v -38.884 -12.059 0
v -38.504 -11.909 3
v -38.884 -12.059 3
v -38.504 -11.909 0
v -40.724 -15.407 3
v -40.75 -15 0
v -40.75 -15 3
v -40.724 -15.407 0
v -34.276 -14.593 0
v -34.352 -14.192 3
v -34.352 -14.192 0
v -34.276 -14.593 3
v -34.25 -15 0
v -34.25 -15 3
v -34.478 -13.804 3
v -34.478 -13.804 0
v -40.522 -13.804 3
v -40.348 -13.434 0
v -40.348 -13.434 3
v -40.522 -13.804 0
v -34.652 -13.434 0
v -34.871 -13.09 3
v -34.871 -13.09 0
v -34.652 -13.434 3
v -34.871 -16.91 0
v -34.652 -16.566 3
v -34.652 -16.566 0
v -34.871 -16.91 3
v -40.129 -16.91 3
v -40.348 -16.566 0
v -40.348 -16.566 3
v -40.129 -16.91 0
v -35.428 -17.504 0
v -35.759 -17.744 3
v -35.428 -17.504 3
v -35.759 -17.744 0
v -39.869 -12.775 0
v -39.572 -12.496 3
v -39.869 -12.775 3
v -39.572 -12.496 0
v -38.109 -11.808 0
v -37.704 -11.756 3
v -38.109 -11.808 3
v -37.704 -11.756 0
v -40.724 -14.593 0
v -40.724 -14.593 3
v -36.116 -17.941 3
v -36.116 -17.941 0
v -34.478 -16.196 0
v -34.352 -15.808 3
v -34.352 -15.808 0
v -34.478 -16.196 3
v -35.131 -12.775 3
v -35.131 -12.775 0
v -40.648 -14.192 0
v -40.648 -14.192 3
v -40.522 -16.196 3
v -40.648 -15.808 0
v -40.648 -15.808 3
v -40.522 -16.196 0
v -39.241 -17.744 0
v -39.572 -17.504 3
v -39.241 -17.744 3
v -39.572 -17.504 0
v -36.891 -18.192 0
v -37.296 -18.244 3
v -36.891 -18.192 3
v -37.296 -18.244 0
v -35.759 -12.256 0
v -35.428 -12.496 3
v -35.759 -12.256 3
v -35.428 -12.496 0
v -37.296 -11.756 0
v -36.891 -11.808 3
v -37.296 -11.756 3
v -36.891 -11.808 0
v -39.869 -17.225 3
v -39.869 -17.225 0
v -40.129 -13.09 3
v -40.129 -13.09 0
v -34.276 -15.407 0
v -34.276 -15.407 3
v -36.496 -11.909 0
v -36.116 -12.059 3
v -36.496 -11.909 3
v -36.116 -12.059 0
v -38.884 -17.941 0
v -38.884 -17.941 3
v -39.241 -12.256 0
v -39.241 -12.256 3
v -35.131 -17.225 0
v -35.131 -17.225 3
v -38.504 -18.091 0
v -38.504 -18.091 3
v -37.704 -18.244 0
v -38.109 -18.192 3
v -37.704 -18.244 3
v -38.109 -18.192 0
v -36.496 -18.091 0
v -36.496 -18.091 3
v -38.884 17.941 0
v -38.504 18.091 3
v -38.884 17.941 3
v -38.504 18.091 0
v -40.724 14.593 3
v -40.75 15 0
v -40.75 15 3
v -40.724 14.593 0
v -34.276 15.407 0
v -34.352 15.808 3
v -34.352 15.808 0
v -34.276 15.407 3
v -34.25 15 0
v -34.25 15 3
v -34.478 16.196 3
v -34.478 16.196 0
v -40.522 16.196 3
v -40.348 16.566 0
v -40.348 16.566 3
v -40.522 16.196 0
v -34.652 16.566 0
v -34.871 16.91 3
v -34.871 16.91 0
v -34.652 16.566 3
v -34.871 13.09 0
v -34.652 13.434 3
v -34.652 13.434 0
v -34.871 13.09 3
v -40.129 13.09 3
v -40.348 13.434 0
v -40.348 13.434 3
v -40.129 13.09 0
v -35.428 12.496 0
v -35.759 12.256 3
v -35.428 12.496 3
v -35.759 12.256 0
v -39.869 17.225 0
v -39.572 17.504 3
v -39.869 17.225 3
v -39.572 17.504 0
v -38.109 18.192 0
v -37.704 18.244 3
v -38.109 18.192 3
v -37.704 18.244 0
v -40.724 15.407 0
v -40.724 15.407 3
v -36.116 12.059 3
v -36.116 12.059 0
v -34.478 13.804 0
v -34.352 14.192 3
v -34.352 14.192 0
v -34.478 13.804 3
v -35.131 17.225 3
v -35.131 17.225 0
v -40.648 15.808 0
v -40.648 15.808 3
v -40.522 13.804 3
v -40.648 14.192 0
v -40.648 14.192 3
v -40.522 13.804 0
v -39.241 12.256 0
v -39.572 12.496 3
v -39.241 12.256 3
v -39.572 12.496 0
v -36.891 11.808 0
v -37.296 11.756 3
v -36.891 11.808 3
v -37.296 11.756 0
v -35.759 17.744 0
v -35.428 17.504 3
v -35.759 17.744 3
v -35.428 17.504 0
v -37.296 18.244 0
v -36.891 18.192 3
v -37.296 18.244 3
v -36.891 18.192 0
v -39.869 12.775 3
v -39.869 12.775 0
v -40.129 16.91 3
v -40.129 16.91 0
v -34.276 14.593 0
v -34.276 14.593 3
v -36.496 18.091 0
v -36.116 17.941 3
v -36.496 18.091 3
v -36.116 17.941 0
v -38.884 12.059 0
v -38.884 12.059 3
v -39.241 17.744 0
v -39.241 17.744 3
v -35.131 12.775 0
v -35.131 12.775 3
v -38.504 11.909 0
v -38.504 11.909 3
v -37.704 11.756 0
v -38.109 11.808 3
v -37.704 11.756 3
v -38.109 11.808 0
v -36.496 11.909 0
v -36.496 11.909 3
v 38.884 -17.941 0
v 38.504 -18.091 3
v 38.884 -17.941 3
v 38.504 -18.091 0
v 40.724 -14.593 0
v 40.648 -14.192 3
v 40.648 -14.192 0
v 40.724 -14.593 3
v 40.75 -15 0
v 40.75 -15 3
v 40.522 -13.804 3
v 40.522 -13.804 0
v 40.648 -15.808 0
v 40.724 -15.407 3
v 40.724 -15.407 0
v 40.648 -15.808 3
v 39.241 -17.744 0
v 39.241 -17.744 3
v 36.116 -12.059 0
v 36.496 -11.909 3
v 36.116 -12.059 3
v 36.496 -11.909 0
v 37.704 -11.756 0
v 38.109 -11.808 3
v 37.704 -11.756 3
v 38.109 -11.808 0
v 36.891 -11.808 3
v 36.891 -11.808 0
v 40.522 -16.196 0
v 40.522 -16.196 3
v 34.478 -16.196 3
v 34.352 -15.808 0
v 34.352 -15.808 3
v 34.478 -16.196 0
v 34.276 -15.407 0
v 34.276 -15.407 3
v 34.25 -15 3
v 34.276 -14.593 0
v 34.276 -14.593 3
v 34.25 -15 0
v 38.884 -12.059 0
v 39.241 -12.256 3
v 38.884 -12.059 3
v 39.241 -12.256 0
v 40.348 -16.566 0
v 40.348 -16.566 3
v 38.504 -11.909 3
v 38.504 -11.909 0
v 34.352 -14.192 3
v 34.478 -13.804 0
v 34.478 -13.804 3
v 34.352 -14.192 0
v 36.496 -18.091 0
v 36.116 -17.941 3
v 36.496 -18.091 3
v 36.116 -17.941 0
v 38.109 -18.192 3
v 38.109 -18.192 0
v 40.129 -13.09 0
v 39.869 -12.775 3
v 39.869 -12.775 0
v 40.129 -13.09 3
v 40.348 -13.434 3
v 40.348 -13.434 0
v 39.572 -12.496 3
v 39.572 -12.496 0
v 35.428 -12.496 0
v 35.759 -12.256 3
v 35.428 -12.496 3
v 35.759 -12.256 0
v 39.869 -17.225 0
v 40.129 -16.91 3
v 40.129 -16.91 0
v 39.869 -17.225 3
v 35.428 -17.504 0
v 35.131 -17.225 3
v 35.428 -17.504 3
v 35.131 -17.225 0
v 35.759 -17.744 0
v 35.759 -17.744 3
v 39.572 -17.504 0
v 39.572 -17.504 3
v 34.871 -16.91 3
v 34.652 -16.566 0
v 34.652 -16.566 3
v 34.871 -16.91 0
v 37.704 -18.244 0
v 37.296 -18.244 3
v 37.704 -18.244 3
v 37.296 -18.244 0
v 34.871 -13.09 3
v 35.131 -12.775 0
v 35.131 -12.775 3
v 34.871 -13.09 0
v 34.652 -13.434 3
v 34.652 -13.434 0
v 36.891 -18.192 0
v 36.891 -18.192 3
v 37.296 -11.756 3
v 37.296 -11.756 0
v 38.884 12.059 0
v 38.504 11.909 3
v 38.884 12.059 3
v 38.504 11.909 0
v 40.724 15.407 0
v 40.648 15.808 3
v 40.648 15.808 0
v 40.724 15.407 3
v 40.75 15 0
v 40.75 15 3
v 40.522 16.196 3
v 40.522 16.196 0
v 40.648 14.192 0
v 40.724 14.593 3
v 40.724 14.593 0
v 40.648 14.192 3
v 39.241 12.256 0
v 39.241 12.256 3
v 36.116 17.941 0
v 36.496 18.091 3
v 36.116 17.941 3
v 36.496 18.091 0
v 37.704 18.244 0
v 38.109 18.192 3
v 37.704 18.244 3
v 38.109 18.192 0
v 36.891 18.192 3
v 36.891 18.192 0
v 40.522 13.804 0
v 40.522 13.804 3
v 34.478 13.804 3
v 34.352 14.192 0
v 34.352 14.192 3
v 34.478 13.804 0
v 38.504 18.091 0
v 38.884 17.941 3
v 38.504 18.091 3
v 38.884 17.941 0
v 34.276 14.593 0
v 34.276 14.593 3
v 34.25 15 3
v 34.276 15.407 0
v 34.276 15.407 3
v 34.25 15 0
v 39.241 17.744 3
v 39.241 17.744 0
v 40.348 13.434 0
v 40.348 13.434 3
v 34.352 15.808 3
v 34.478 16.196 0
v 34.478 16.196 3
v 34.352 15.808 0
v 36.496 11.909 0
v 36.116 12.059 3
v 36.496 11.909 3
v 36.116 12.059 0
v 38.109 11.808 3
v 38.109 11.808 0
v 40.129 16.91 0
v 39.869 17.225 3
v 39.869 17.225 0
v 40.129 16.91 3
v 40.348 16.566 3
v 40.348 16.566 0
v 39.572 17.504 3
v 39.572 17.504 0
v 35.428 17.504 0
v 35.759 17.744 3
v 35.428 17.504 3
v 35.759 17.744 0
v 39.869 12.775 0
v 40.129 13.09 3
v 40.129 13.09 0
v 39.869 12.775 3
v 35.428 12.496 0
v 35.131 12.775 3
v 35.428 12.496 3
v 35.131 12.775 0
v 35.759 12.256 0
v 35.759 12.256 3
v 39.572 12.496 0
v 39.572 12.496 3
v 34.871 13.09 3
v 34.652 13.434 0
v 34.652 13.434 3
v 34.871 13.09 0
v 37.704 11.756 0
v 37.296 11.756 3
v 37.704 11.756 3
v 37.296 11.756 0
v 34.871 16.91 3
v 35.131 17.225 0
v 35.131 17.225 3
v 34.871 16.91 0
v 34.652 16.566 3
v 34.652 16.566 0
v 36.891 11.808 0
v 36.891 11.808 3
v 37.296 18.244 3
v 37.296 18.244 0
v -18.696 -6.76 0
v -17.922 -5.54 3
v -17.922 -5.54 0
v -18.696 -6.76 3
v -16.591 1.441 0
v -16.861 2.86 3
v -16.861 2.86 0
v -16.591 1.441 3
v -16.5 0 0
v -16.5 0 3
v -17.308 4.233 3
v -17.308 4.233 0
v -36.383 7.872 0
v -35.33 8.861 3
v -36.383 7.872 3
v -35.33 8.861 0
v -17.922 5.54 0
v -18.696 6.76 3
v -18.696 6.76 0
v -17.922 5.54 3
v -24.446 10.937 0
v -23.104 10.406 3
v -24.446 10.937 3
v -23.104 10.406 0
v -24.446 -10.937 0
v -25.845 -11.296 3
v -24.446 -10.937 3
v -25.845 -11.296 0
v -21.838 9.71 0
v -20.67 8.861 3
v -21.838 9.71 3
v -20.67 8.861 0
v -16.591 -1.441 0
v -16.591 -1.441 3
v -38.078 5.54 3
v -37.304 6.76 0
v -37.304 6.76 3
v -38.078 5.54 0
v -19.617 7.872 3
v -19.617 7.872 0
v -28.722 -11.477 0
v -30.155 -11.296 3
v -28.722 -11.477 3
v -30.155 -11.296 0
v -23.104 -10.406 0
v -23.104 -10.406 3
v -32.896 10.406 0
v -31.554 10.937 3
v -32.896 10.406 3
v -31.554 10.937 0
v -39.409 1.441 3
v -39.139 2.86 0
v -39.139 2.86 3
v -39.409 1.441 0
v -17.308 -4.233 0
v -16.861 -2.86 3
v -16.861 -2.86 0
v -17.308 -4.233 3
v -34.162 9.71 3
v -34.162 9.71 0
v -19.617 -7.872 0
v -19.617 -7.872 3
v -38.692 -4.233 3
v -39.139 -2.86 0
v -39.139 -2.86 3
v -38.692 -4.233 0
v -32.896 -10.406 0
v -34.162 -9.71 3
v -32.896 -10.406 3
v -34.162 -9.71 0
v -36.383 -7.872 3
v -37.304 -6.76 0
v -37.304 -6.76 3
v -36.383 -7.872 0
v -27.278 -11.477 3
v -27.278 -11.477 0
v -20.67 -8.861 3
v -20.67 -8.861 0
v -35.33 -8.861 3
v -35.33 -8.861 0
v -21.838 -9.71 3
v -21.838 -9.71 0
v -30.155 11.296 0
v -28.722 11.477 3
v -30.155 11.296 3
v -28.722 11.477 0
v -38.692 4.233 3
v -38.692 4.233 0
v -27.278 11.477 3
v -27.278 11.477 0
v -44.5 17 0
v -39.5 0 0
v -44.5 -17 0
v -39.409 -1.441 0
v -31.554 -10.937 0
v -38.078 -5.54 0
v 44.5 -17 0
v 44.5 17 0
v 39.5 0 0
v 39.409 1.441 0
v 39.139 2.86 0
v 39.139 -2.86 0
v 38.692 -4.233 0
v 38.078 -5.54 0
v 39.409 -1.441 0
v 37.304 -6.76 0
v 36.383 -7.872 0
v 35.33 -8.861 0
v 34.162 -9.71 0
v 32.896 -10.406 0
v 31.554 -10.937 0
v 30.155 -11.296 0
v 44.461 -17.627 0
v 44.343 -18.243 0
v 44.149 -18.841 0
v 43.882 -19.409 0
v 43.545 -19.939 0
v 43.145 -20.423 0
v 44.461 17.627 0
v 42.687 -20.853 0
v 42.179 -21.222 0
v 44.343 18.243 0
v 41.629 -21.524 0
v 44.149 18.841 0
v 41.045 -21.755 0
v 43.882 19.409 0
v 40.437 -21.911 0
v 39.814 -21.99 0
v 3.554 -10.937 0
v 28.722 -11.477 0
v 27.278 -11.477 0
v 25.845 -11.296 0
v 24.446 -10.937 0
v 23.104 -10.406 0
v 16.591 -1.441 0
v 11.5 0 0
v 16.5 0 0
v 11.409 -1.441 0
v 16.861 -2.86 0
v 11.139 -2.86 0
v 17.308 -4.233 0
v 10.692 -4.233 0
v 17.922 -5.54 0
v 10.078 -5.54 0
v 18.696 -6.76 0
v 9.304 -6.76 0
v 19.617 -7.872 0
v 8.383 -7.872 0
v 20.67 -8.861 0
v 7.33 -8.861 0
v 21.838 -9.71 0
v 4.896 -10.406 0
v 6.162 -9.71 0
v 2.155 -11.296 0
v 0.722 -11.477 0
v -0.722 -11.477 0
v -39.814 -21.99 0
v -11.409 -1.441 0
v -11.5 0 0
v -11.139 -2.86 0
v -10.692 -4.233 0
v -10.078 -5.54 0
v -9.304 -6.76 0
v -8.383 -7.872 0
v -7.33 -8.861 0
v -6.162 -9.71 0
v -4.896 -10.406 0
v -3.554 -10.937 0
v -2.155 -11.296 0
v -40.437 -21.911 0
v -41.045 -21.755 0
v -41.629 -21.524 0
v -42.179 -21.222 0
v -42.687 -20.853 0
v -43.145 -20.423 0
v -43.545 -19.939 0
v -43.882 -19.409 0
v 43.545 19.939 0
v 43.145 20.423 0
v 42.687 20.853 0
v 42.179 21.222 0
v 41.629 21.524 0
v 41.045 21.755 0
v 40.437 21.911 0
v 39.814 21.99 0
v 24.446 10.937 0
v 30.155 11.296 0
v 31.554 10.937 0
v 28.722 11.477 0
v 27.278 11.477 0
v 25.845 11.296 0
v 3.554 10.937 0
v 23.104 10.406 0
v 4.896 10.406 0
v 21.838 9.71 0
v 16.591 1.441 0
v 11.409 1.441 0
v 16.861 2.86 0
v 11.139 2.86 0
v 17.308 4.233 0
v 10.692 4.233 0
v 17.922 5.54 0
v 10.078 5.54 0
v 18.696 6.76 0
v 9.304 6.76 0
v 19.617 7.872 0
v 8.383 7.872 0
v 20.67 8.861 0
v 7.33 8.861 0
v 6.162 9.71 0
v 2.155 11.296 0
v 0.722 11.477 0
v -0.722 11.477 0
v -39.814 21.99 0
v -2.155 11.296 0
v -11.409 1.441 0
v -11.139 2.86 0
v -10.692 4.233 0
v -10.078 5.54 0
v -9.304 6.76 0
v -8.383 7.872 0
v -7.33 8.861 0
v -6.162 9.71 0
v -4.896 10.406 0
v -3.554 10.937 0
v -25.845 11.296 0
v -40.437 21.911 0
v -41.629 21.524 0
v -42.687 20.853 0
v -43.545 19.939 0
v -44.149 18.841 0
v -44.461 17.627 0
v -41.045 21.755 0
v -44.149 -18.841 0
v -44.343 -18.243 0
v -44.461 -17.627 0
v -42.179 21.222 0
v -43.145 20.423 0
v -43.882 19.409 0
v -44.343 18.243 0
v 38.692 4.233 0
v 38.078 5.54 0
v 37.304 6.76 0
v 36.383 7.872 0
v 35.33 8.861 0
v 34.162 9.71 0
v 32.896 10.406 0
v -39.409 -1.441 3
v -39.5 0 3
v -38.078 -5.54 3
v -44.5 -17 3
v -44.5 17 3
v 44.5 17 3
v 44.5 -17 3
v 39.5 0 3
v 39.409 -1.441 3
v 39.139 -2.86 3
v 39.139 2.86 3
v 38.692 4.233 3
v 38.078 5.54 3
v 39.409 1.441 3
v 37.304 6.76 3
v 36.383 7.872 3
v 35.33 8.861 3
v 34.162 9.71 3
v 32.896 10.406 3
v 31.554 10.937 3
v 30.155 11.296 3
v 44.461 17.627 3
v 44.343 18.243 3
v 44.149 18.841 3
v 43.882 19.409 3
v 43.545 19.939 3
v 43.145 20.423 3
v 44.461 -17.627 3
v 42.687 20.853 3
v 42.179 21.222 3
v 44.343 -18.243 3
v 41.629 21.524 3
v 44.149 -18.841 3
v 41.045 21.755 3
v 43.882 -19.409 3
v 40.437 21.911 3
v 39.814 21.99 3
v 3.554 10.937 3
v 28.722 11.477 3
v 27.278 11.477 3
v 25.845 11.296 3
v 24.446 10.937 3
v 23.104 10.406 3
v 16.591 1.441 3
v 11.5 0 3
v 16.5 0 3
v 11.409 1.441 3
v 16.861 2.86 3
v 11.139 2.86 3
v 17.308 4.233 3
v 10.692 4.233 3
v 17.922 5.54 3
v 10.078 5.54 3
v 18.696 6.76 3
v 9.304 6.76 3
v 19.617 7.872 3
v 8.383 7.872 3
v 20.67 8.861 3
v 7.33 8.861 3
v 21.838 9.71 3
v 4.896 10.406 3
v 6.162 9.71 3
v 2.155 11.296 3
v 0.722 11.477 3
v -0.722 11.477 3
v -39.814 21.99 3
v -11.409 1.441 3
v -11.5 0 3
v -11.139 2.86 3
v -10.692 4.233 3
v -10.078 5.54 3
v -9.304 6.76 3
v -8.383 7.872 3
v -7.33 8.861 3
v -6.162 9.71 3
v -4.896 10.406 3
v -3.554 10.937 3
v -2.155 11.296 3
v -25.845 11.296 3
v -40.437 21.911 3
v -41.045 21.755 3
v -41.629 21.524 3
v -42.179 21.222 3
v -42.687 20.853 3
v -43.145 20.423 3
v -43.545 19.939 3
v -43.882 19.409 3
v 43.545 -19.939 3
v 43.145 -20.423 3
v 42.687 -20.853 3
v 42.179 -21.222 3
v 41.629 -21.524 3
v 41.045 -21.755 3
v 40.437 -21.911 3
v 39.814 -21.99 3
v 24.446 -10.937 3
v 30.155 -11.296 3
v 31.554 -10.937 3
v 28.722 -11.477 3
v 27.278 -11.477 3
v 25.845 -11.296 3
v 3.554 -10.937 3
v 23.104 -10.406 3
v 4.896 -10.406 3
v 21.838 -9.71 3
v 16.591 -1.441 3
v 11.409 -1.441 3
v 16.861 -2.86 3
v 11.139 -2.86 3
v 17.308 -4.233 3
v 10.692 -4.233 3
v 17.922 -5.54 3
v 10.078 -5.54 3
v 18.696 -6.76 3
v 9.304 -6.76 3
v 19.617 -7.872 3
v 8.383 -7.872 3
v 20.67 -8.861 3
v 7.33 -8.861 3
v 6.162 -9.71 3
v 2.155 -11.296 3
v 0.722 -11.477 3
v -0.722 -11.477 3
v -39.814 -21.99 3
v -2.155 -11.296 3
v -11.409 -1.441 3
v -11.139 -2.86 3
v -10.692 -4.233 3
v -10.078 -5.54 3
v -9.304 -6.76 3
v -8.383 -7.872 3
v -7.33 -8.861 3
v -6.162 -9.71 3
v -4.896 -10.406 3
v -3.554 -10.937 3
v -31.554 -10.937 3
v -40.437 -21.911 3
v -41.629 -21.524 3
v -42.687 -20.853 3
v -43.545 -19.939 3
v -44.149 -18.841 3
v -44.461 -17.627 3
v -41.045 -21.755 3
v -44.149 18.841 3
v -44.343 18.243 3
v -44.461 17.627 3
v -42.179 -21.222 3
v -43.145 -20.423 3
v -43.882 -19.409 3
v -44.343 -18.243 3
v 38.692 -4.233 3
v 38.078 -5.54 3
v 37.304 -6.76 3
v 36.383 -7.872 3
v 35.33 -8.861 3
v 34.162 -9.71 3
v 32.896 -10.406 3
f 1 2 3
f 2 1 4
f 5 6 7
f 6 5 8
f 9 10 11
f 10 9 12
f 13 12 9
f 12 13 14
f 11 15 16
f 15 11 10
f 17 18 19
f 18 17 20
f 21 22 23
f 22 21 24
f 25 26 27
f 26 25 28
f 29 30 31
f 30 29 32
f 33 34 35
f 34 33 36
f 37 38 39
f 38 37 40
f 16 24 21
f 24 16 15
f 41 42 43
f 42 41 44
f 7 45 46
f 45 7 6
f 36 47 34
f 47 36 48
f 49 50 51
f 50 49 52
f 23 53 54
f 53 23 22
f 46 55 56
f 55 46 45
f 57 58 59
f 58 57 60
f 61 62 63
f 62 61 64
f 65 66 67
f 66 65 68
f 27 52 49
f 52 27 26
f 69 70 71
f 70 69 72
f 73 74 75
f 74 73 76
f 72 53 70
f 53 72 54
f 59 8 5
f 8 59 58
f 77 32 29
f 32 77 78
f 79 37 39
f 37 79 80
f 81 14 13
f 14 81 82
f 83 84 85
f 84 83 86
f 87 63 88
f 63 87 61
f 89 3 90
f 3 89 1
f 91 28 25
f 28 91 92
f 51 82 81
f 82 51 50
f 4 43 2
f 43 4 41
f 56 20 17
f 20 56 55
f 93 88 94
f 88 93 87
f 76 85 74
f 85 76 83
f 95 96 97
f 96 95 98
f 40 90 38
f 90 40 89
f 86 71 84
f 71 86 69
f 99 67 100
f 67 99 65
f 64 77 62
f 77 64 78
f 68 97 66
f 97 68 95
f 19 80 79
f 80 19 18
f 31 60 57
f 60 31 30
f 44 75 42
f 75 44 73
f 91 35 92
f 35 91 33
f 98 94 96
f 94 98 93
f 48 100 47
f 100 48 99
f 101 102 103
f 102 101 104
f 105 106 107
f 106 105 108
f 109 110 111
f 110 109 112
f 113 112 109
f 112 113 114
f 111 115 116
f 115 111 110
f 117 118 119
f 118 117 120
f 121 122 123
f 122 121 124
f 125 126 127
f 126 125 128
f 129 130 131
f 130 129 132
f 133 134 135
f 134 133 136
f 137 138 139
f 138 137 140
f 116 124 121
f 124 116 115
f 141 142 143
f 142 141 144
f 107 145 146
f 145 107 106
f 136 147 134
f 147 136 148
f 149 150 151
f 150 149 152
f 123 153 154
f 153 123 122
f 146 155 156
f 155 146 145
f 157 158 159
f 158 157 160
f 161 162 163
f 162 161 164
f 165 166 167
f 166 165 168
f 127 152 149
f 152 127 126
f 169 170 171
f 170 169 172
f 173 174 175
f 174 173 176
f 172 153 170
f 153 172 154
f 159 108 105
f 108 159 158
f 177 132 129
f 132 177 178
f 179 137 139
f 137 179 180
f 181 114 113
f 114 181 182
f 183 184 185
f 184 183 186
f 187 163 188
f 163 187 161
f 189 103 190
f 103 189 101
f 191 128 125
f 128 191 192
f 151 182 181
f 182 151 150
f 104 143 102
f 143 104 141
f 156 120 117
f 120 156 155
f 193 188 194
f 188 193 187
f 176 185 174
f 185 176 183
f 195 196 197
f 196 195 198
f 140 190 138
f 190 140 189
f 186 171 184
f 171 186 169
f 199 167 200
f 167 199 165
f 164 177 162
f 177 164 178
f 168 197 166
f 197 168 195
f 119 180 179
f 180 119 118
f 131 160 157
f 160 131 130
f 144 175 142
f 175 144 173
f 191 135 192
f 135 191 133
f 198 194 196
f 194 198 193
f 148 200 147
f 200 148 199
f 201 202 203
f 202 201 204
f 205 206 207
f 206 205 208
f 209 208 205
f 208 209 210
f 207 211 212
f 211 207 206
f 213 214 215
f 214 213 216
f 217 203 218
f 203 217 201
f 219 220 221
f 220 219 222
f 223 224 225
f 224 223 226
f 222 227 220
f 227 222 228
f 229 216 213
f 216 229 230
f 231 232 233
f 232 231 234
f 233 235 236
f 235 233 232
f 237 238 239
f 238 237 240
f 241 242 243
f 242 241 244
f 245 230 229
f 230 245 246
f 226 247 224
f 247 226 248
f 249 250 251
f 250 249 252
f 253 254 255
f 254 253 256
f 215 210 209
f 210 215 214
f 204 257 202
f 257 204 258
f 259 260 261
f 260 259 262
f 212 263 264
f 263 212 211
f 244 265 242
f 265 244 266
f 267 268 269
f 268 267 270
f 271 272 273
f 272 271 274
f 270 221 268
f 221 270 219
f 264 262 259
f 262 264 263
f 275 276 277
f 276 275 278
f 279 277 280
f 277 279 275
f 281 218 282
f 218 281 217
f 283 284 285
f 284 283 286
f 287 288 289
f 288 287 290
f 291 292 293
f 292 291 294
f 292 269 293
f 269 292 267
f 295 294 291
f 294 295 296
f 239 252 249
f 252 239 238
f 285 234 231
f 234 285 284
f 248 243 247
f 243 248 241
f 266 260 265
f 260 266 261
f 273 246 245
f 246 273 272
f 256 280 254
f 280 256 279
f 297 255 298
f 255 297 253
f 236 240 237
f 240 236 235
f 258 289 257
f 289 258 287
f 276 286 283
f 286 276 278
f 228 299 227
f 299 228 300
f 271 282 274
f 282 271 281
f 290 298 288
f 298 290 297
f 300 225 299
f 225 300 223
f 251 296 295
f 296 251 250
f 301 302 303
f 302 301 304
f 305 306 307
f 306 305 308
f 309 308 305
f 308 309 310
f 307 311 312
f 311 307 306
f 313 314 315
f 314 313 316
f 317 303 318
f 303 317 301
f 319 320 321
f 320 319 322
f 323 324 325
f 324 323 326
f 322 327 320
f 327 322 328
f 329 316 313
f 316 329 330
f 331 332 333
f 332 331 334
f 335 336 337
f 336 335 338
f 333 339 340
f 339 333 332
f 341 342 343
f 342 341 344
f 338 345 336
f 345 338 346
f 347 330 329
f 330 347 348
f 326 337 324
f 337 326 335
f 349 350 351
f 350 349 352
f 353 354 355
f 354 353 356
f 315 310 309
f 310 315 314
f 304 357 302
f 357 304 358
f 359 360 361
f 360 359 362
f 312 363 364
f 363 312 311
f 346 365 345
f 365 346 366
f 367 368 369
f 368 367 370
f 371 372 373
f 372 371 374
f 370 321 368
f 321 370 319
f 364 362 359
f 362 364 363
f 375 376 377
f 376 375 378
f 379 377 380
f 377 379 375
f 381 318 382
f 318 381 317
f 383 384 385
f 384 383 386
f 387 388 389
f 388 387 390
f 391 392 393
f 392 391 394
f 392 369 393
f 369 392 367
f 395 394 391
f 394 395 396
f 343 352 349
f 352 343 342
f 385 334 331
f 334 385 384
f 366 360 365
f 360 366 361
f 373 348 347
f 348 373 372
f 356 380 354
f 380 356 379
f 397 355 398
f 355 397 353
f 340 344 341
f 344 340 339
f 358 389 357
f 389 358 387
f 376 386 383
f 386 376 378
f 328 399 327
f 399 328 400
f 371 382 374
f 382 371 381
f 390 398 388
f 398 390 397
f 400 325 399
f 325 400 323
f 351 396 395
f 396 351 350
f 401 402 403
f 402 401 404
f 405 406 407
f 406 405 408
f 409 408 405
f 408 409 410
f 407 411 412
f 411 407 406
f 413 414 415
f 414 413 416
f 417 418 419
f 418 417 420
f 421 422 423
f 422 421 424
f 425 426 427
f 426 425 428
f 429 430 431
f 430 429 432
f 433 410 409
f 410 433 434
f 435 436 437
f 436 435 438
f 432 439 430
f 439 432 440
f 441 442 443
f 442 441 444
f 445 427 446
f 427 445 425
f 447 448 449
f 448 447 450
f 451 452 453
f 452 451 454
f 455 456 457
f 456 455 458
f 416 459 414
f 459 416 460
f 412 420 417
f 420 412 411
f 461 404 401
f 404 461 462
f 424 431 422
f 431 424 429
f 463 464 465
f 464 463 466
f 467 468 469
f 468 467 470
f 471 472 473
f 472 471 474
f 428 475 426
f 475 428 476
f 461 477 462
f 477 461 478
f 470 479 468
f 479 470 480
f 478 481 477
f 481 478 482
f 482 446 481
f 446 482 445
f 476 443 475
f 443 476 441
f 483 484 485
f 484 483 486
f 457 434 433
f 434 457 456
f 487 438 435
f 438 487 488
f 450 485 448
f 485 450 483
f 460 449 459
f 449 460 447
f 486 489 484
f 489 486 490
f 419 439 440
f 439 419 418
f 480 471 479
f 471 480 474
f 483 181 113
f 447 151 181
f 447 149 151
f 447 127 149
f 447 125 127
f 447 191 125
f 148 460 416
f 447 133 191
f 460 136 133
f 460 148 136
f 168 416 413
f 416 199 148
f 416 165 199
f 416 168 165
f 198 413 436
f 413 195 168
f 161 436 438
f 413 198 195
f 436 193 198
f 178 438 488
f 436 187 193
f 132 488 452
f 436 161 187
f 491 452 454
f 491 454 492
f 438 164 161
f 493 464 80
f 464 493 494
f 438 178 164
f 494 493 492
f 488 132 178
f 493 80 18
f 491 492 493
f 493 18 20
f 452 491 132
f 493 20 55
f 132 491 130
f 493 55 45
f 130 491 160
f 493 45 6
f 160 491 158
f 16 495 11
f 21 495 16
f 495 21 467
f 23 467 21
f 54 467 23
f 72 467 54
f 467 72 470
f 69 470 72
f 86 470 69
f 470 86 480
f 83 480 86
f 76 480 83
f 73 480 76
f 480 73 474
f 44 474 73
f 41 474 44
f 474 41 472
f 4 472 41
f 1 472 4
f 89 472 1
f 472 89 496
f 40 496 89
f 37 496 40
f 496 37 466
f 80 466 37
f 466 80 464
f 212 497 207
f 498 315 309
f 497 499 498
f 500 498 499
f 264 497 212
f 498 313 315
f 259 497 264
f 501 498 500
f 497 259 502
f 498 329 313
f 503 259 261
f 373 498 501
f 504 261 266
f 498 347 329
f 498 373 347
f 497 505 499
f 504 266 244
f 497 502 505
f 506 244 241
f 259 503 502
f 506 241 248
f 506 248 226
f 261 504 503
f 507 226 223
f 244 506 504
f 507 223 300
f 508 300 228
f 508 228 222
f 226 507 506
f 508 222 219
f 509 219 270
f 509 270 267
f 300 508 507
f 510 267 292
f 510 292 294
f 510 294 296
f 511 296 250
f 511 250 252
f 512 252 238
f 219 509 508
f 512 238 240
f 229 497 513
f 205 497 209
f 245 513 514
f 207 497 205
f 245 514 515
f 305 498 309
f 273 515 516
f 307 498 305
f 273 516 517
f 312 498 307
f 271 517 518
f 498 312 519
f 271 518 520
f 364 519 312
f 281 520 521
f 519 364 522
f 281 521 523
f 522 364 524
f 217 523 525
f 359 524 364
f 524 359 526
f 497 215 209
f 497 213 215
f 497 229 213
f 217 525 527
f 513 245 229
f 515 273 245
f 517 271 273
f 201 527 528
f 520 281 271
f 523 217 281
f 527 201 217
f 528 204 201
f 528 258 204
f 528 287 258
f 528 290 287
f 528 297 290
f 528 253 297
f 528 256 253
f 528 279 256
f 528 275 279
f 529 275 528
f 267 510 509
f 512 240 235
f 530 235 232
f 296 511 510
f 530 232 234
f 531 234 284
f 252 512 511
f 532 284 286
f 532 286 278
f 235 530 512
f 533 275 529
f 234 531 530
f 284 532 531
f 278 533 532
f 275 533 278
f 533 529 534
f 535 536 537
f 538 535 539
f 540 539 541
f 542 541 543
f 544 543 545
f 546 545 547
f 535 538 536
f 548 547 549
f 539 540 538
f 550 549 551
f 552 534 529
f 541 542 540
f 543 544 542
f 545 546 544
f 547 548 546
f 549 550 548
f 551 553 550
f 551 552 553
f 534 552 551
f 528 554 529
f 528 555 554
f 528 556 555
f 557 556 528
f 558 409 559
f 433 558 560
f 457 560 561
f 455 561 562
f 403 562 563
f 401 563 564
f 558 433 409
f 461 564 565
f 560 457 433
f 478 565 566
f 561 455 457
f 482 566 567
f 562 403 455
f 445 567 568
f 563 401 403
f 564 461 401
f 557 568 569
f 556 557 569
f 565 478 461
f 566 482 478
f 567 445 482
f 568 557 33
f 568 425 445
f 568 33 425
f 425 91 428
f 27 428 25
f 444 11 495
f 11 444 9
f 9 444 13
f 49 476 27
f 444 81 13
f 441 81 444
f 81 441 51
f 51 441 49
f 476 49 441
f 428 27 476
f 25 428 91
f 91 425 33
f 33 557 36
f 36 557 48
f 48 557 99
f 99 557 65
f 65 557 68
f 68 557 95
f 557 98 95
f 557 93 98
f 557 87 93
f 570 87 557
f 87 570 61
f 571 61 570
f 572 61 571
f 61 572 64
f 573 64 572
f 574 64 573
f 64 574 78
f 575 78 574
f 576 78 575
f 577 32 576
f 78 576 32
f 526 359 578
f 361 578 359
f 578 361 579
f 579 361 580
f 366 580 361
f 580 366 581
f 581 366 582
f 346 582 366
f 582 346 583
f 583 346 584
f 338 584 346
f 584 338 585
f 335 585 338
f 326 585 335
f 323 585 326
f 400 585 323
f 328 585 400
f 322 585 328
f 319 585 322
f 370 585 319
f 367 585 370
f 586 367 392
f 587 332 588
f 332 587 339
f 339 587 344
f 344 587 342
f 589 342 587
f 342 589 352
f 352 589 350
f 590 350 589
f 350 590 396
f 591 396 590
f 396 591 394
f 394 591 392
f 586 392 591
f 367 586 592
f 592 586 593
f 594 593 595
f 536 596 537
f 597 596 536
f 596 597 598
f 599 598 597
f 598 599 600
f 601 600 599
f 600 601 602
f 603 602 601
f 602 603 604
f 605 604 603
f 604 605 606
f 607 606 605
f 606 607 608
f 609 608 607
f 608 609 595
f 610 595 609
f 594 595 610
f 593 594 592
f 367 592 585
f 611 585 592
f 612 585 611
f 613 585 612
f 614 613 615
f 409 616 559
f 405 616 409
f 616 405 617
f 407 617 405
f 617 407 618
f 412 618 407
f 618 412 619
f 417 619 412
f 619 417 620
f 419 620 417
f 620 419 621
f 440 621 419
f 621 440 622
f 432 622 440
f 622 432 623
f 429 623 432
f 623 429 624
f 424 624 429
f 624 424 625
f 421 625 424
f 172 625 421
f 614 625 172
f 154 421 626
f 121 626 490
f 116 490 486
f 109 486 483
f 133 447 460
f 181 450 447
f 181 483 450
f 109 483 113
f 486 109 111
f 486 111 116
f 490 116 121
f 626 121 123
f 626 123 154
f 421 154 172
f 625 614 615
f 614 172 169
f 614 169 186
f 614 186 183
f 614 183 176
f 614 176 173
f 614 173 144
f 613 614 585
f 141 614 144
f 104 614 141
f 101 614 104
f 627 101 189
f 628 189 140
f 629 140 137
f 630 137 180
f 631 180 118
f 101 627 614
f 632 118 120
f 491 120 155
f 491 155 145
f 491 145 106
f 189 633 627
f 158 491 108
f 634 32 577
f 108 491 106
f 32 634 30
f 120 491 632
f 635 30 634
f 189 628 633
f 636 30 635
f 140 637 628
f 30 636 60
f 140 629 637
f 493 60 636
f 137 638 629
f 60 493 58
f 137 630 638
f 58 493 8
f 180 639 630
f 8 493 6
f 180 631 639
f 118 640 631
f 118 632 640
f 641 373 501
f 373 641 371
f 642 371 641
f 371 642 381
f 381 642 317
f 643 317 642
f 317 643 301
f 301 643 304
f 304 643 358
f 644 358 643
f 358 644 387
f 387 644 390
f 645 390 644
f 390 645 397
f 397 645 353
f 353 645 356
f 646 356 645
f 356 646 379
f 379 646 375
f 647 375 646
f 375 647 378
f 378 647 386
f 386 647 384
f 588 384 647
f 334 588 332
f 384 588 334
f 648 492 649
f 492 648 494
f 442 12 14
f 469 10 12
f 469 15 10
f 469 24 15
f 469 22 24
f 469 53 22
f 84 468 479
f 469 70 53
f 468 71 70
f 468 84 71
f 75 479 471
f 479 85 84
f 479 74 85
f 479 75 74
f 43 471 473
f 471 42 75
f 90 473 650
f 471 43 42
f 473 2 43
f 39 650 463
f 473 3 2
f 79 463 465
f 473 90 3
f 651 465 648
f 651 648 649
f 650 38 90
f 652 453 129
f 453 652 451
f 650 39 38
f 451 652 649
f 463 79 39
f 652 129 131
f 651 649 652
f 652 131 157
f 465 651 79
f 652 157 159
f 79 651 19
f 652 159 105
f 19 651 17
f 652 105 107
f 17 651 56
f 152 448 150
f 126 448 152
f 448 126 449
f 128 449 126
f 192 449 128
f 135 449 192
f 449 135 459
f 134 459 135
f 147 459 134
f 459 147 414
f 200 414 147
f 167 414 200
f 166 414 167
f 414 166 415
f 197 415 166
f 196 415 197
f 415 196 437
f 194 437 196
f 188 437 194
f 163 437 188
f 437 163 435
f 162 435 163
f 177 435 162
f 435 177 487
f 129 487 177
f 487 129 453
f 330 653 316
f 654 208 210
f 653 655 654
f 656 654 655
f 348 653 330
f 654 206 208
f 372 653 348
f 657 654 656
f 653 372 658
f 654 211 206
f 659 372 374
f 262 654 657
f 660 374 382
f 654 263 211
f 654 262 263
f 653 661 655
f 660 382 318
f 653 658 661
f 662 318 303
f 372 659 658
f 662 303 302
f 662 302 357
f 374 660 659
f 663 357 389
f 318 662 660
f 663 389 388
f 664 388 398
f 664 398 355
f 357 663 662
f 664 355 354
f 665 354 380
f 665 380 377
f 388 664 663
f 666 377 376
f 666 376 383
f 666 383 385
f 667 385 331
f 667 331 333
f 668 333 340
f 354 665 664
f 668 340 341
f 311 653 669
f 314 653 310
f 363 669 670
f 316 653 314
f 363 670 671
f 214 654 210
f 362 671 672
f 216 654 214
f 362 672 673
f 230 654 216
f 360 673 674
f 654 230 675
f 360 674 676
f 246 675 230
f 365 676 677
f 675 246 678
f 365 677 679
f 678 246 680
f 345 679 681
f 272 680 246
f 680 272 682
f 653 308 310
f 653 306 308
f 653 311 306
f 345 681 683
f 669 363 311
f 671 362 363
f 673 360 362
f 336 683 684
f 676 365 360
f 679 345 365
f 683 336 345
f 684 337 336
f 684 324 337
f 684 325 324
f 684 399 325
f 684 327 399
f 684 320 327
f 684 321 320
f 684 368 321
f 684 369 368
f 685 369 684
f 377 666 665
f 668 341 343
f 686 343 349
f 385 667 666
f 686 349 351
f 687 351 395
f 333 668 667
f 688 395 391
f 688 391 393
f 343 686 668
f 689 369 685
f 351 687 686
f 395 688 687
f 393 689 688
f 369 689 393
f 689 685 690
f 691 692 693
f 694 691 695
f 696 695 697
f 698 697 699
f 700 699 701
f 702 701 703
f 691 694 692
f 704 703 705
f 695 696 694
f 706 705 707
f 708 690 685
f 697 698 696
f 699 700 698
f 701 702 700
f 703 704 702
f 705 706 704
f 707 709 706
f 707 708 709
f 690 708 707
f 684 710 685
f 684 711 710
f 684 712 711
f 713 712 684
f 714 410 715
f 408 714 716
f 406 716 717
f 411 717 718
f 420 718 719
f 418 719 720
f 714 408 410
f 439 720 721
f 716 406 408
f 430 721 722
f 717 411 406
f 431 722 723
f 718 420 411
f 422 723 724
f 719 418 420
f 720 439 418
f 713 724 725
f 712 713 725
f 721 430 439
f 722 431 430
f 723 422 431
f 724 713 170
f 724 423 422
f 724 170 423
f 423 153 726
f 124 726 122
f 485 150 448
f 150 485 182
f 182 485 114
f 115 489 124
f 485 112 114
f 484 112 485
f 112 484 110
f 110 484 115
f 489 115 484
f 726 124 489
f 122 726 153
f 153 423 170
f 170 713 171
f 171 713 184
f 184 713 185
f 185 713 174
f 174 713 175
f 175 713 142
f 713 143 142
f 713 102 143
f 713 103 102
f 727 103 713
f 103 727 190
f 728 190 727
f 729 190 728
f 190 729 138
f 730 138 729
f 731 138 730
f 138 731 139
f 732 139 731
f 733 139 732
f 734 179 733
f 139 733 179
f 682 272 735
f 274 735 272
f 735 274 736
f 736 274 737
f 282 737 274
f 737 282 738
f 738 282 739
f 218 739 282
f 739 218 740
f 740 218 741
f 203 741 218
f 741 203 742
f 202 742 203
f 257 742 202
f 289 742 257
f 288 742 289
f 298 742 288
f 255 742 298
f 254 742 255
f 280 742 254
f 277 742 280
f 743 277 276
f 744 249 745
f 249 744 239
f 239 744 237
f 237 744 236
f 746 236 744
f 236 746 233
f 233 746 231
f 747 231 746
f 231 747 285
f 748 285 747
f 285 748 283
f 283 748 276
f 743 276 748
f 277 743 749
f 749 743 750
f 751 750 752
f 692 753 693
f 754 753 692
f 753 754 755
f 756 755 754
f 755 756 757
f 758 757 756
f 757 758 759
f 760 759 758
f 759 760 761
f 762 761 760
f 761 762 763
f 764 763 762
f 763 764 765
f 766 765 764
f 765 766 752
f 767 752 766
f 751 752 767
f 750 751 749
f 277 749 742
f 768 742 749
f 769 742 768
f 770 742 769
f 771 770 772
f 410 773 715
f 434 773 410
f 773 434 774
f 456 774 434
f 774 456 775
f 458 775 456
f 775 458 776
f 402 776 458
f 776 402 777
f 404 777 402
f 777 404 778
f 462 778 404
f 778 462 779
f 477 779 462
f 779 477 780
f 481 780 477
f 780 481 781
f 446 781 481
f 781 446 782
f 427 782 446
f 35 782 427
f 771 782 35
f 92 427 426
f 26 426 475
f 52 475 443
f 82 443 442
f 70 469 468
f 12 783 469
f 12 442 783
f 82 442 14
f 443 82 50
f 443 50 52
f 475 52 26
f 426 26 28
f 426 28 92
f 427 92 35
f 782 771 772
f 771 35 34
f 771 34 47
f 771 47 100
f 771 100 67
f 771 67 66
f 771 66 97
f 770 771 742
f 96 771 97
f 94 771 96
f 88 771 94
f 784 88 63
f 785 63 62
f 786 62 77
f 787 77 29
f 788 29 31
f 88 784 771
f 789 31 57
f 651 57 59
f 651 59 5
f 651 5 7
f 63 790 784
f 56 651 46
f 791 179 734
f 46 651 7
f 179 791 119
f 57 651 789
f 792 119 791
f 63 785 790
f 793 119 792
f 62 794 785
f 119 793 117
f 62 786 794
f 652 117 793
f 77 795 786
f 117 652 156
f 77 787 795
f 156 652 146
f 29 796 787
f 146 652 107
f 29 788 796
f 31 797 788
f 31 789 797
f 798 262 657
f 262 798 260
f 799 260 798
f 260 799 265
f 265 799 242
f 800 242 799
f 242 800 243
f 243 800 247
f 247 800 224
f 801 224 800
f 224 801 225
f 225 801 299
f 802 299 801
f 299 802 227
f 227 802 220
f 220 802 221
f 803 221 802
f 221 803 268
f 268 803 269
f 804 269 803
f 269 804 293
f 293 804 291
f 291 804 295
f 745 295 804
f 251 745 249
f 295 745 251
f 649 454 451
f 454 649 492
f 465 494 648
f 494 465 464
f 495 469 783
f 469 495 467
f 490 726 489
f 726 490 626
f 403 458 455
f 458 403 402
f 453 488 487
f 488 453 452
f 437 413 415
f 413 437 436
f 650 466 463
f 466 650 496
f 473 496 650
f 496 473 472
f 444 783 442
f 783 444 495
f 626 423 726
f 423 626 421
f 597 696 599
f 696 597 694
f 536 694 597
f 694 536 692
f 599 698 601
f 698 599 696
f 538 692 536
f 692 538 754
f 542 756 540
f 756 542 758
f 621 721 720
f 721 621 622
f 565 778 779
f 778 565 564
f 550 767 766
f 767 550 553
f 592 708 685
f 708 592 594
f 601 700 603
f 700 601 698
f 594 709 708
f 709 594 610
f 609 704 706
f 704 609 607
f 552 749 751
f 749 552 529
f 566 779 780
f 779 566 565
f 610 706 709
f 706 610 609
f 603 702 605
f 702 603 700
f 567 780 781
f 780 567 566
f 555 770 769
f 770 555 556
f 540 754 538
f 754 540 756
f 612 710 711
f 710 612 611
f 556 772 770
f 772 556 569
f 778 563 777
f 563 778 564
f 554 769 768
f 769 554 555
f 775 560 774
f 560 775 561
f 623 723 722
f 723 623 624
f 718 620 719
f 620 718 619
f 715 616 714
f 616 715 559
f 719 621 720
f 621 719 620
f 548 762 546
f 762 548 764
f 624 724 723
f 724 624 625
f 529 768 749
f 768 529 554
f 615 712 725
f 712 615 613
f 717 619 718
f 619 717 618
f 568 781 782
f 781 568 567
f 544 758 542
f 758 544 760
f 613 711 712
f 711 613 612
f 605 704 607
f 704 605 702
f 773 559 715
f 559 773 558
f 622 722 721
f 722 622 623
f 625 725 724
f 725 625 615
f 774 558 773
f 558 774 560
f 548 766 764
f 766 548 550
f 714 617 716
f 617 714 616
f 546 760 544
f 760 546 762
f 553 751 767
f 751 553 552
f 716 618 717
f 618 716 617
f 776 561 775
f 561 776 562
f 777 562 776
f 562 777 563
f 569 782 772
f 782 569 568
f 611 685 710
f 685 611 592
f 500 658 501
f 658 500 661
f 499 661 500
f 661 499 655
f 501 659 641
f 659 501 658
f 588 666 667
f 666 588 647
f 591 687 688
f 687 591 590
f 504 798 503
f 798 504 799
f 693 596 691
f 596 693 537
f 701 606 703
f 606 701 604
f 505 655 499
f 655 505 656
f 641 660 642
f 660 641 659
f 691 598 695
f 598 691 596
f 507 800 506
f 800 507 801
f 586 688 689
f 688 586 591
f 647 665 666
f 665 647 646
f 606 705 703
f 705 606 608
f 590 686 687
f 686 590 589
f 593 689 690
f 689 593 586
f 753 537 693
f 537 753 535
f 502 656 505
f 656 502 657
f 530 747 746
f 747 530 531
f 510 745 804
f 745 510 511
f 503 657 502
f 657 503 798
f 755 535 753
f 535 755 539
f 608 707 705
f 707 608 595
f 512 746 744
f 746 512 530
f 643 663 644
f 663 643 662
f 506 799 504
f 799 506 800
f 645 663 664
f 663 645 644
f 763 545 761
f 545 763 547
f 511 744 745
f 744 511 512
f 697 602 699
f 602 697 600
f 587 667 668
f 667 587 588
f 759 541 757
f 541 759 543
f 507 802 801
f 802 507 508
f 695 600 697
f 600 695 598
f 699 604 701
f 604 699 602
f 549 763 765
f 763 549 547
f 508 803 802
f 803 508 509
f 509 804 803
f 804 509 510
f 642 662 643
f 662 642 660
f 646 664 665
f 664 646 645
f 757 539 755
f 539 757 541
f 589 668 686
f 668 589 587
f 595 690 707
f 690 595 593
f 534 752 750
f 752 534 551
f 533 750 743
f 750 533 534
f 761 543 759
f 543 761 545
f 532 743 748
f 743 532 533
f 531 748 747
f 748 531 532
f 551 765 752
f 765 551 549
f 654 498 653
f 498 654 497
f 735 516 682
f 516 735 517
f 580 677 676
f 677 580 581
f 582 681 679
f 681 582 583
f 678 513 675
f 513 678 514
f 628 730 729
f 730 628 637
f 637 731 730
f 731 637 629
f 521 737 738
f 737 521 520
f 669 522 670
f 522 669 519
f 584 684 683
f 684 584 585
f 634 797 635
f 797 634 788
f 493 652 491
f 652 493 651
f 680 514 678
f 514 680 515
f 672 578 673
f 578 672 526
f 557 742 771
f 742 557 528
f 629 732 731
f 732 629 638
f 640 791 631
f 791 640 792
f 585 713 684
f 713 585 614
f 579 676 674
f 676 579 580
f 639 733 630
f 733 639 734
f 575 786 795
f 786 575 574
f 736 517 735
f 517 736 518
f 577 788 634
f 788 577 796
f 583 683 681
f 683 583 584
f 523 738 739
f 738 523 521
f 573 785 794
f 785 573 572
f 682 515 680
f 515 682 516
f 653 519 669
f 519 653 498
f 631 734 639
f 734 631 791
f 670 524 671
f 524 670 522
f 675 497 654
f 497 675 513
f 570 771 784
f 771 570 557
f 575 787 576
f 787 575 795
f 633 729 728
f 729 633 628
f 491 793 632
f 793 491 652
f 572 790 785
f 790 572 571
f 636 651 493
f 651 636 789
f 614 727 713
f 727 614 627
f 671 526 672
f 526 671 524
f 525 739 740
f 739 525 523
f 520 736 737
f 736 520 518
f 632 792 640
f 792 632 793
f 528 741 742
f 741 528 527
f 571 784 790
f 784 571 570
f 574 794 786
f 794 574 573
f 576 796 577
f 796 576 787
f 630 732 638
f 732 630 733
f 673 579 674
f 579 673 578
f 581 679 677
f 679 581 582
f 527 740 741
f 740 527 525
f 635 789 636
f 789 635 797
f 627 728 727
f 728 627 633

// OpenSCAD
$fn = 50;


difference() {
	union() {
		hull() {
			translate(v = [-39.5000000000, 17.0000000000, 0]) {
				cylinder(h = 3, r = 5);
			}
			translate(v = [39.5000000000, 17.0000000000, 0]) {
				cylinder(h = 3, r = 5);
			}
			translate(v = [-39.5000000000, -17.0000000000, 0]) {
				cylinder(h = 3, r = 5);
			}
			translate(v = [39.5000000000, -17.0000000000, 0]) {
				cylinder(h = 3, r = 5);
			}
		}
	}
	union() {
		#translate(v = [-37.5000000000, -15.0000000000, -100.0000000000]) {
			cylinder(h = 200, r = 3.2500000000);
		}
		#translate(v = [-37.5000000000, 15.0000000000, -100.0000000000]) {
			cylinder(h = 200, r = 3.2500000000);
		}
		#translate(v = [37.5000000000, -15.0000000000, -100.0000000000]) {
			cylinder(h = 200, r = 3.2500000000);
		}
		#translate(v = [37.5000000000, 15.0000000000, -100.0000000000]) {
			cylinder(h = 200, r = 3.2500000000);
		}
		#translate(v = [-28.0000000000, 0, 0]) {
			cylinder(h = 3, r = 11.5000000000);
		}
		#cylinder(h = 3, r = 11.5000000000);
		#translate(v = [28.0000000000, 0, 0]) {
			cylinder(h = 3, r = 11.5000000000);
		}
	}
}
